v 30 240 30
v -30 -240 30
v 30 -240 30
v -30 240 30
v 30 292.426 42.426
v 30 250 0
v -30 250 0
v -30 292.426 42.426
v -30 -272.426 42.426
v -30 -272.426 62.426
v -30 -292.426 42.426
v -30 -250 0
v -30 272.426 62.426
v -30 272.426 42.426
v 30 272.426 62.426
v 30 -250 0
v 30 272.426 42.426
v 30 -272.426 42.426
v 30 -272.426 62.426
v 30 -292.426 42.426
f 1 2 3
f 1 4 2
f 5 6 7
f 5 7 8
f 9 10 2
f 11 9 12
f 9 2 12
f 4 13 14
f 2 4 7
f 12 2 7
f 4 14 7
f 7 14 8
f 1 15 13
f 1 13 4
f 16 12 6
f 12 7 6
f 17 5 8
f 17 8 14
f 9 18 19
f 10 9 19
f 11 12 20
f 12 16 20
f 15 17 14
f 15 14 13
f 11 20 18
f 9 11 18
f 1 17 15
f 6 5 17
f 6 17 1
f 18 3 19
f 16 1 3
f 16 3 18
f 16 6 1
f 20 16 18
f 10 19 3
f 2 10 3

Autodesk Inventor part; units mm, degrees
ref_plane "YZ Plane" through (0, 0, 0) normal (1, 0, 0) x (0, 1, 0)
ref_plane "XZ Plane" through (0, 0, 0) normal (0, 1, 0) x (-1, 0, 0)
ref_plane "XY Plane" through (0, 0, 0) normal (0, 0, 1) x (1, 0, 0)
sketch "草圖1" plane through (0, 0, 0) normal (0, 0, 1) x (1, 0, 0)
  line L0 (30, -250) -> (-30, -250)
  line L1 (-30, -250) -> (-30, 250)
  line L2 (-30, 250) -> (30, 250)
  line L3 (30, 250) -> (30, -250)
  line L4 (30, -250) -> (-30, 250) construction
  line L5 (-30, -250) -> (30, 250) construction
  point P0 (0, 0)
  dimension "d0" = 60
  dimension "d1" = 500
extrude "擠出1" add sketch "草圖1" along normal blind 30
sketch "草圖2" plane through (30, -250, 0) normal (1, 0, 0) x (0, 0, -1)
  line L0 (0, 500) -> (0, 0) projected
  line L1 (0, 0) -> (-42.4264, -42.4264)
  line L2 (0, 0) -> (60, 0) construction
  line L3 (-42.4264, -42.4264) -> (-42.4264, -22.4264)
  line L4 (-42.4264, -22.4264) -> (-62.4264, -22.4264)
  line L5 (-62.4264, -22.4264) -> (-23.4773, 16.5227)
  line L6 (0, 0) -> (-23.4773, 16.5227)
  line L7 (0, 500) -> (-42.4264, 542.4264)
  line L8 (-42.4264, 542.4264) -> (-42.4264, 522.4264)
  line L9 (-42.4264, 522.4264) -> (-62.4264, 522.4264)
  line L10 (-62.4264, 522.4264) -> (-16.5227, 476.5227)
  line L11 (-16.5227, 476.5227) -> (0, 500)
  point P0 (0, 250)
  dimension "d4" = 60
  dimension "d5" = 135
  dimension "d6" = 20
  dimension "d7" = 20
  dimension "d8" = 60
  dimension "d9" = 20
  dimension "d10" = 20
extrude "擠出2" add sketch "草圖2" against normal blind 60
properties part number "DOF5"
